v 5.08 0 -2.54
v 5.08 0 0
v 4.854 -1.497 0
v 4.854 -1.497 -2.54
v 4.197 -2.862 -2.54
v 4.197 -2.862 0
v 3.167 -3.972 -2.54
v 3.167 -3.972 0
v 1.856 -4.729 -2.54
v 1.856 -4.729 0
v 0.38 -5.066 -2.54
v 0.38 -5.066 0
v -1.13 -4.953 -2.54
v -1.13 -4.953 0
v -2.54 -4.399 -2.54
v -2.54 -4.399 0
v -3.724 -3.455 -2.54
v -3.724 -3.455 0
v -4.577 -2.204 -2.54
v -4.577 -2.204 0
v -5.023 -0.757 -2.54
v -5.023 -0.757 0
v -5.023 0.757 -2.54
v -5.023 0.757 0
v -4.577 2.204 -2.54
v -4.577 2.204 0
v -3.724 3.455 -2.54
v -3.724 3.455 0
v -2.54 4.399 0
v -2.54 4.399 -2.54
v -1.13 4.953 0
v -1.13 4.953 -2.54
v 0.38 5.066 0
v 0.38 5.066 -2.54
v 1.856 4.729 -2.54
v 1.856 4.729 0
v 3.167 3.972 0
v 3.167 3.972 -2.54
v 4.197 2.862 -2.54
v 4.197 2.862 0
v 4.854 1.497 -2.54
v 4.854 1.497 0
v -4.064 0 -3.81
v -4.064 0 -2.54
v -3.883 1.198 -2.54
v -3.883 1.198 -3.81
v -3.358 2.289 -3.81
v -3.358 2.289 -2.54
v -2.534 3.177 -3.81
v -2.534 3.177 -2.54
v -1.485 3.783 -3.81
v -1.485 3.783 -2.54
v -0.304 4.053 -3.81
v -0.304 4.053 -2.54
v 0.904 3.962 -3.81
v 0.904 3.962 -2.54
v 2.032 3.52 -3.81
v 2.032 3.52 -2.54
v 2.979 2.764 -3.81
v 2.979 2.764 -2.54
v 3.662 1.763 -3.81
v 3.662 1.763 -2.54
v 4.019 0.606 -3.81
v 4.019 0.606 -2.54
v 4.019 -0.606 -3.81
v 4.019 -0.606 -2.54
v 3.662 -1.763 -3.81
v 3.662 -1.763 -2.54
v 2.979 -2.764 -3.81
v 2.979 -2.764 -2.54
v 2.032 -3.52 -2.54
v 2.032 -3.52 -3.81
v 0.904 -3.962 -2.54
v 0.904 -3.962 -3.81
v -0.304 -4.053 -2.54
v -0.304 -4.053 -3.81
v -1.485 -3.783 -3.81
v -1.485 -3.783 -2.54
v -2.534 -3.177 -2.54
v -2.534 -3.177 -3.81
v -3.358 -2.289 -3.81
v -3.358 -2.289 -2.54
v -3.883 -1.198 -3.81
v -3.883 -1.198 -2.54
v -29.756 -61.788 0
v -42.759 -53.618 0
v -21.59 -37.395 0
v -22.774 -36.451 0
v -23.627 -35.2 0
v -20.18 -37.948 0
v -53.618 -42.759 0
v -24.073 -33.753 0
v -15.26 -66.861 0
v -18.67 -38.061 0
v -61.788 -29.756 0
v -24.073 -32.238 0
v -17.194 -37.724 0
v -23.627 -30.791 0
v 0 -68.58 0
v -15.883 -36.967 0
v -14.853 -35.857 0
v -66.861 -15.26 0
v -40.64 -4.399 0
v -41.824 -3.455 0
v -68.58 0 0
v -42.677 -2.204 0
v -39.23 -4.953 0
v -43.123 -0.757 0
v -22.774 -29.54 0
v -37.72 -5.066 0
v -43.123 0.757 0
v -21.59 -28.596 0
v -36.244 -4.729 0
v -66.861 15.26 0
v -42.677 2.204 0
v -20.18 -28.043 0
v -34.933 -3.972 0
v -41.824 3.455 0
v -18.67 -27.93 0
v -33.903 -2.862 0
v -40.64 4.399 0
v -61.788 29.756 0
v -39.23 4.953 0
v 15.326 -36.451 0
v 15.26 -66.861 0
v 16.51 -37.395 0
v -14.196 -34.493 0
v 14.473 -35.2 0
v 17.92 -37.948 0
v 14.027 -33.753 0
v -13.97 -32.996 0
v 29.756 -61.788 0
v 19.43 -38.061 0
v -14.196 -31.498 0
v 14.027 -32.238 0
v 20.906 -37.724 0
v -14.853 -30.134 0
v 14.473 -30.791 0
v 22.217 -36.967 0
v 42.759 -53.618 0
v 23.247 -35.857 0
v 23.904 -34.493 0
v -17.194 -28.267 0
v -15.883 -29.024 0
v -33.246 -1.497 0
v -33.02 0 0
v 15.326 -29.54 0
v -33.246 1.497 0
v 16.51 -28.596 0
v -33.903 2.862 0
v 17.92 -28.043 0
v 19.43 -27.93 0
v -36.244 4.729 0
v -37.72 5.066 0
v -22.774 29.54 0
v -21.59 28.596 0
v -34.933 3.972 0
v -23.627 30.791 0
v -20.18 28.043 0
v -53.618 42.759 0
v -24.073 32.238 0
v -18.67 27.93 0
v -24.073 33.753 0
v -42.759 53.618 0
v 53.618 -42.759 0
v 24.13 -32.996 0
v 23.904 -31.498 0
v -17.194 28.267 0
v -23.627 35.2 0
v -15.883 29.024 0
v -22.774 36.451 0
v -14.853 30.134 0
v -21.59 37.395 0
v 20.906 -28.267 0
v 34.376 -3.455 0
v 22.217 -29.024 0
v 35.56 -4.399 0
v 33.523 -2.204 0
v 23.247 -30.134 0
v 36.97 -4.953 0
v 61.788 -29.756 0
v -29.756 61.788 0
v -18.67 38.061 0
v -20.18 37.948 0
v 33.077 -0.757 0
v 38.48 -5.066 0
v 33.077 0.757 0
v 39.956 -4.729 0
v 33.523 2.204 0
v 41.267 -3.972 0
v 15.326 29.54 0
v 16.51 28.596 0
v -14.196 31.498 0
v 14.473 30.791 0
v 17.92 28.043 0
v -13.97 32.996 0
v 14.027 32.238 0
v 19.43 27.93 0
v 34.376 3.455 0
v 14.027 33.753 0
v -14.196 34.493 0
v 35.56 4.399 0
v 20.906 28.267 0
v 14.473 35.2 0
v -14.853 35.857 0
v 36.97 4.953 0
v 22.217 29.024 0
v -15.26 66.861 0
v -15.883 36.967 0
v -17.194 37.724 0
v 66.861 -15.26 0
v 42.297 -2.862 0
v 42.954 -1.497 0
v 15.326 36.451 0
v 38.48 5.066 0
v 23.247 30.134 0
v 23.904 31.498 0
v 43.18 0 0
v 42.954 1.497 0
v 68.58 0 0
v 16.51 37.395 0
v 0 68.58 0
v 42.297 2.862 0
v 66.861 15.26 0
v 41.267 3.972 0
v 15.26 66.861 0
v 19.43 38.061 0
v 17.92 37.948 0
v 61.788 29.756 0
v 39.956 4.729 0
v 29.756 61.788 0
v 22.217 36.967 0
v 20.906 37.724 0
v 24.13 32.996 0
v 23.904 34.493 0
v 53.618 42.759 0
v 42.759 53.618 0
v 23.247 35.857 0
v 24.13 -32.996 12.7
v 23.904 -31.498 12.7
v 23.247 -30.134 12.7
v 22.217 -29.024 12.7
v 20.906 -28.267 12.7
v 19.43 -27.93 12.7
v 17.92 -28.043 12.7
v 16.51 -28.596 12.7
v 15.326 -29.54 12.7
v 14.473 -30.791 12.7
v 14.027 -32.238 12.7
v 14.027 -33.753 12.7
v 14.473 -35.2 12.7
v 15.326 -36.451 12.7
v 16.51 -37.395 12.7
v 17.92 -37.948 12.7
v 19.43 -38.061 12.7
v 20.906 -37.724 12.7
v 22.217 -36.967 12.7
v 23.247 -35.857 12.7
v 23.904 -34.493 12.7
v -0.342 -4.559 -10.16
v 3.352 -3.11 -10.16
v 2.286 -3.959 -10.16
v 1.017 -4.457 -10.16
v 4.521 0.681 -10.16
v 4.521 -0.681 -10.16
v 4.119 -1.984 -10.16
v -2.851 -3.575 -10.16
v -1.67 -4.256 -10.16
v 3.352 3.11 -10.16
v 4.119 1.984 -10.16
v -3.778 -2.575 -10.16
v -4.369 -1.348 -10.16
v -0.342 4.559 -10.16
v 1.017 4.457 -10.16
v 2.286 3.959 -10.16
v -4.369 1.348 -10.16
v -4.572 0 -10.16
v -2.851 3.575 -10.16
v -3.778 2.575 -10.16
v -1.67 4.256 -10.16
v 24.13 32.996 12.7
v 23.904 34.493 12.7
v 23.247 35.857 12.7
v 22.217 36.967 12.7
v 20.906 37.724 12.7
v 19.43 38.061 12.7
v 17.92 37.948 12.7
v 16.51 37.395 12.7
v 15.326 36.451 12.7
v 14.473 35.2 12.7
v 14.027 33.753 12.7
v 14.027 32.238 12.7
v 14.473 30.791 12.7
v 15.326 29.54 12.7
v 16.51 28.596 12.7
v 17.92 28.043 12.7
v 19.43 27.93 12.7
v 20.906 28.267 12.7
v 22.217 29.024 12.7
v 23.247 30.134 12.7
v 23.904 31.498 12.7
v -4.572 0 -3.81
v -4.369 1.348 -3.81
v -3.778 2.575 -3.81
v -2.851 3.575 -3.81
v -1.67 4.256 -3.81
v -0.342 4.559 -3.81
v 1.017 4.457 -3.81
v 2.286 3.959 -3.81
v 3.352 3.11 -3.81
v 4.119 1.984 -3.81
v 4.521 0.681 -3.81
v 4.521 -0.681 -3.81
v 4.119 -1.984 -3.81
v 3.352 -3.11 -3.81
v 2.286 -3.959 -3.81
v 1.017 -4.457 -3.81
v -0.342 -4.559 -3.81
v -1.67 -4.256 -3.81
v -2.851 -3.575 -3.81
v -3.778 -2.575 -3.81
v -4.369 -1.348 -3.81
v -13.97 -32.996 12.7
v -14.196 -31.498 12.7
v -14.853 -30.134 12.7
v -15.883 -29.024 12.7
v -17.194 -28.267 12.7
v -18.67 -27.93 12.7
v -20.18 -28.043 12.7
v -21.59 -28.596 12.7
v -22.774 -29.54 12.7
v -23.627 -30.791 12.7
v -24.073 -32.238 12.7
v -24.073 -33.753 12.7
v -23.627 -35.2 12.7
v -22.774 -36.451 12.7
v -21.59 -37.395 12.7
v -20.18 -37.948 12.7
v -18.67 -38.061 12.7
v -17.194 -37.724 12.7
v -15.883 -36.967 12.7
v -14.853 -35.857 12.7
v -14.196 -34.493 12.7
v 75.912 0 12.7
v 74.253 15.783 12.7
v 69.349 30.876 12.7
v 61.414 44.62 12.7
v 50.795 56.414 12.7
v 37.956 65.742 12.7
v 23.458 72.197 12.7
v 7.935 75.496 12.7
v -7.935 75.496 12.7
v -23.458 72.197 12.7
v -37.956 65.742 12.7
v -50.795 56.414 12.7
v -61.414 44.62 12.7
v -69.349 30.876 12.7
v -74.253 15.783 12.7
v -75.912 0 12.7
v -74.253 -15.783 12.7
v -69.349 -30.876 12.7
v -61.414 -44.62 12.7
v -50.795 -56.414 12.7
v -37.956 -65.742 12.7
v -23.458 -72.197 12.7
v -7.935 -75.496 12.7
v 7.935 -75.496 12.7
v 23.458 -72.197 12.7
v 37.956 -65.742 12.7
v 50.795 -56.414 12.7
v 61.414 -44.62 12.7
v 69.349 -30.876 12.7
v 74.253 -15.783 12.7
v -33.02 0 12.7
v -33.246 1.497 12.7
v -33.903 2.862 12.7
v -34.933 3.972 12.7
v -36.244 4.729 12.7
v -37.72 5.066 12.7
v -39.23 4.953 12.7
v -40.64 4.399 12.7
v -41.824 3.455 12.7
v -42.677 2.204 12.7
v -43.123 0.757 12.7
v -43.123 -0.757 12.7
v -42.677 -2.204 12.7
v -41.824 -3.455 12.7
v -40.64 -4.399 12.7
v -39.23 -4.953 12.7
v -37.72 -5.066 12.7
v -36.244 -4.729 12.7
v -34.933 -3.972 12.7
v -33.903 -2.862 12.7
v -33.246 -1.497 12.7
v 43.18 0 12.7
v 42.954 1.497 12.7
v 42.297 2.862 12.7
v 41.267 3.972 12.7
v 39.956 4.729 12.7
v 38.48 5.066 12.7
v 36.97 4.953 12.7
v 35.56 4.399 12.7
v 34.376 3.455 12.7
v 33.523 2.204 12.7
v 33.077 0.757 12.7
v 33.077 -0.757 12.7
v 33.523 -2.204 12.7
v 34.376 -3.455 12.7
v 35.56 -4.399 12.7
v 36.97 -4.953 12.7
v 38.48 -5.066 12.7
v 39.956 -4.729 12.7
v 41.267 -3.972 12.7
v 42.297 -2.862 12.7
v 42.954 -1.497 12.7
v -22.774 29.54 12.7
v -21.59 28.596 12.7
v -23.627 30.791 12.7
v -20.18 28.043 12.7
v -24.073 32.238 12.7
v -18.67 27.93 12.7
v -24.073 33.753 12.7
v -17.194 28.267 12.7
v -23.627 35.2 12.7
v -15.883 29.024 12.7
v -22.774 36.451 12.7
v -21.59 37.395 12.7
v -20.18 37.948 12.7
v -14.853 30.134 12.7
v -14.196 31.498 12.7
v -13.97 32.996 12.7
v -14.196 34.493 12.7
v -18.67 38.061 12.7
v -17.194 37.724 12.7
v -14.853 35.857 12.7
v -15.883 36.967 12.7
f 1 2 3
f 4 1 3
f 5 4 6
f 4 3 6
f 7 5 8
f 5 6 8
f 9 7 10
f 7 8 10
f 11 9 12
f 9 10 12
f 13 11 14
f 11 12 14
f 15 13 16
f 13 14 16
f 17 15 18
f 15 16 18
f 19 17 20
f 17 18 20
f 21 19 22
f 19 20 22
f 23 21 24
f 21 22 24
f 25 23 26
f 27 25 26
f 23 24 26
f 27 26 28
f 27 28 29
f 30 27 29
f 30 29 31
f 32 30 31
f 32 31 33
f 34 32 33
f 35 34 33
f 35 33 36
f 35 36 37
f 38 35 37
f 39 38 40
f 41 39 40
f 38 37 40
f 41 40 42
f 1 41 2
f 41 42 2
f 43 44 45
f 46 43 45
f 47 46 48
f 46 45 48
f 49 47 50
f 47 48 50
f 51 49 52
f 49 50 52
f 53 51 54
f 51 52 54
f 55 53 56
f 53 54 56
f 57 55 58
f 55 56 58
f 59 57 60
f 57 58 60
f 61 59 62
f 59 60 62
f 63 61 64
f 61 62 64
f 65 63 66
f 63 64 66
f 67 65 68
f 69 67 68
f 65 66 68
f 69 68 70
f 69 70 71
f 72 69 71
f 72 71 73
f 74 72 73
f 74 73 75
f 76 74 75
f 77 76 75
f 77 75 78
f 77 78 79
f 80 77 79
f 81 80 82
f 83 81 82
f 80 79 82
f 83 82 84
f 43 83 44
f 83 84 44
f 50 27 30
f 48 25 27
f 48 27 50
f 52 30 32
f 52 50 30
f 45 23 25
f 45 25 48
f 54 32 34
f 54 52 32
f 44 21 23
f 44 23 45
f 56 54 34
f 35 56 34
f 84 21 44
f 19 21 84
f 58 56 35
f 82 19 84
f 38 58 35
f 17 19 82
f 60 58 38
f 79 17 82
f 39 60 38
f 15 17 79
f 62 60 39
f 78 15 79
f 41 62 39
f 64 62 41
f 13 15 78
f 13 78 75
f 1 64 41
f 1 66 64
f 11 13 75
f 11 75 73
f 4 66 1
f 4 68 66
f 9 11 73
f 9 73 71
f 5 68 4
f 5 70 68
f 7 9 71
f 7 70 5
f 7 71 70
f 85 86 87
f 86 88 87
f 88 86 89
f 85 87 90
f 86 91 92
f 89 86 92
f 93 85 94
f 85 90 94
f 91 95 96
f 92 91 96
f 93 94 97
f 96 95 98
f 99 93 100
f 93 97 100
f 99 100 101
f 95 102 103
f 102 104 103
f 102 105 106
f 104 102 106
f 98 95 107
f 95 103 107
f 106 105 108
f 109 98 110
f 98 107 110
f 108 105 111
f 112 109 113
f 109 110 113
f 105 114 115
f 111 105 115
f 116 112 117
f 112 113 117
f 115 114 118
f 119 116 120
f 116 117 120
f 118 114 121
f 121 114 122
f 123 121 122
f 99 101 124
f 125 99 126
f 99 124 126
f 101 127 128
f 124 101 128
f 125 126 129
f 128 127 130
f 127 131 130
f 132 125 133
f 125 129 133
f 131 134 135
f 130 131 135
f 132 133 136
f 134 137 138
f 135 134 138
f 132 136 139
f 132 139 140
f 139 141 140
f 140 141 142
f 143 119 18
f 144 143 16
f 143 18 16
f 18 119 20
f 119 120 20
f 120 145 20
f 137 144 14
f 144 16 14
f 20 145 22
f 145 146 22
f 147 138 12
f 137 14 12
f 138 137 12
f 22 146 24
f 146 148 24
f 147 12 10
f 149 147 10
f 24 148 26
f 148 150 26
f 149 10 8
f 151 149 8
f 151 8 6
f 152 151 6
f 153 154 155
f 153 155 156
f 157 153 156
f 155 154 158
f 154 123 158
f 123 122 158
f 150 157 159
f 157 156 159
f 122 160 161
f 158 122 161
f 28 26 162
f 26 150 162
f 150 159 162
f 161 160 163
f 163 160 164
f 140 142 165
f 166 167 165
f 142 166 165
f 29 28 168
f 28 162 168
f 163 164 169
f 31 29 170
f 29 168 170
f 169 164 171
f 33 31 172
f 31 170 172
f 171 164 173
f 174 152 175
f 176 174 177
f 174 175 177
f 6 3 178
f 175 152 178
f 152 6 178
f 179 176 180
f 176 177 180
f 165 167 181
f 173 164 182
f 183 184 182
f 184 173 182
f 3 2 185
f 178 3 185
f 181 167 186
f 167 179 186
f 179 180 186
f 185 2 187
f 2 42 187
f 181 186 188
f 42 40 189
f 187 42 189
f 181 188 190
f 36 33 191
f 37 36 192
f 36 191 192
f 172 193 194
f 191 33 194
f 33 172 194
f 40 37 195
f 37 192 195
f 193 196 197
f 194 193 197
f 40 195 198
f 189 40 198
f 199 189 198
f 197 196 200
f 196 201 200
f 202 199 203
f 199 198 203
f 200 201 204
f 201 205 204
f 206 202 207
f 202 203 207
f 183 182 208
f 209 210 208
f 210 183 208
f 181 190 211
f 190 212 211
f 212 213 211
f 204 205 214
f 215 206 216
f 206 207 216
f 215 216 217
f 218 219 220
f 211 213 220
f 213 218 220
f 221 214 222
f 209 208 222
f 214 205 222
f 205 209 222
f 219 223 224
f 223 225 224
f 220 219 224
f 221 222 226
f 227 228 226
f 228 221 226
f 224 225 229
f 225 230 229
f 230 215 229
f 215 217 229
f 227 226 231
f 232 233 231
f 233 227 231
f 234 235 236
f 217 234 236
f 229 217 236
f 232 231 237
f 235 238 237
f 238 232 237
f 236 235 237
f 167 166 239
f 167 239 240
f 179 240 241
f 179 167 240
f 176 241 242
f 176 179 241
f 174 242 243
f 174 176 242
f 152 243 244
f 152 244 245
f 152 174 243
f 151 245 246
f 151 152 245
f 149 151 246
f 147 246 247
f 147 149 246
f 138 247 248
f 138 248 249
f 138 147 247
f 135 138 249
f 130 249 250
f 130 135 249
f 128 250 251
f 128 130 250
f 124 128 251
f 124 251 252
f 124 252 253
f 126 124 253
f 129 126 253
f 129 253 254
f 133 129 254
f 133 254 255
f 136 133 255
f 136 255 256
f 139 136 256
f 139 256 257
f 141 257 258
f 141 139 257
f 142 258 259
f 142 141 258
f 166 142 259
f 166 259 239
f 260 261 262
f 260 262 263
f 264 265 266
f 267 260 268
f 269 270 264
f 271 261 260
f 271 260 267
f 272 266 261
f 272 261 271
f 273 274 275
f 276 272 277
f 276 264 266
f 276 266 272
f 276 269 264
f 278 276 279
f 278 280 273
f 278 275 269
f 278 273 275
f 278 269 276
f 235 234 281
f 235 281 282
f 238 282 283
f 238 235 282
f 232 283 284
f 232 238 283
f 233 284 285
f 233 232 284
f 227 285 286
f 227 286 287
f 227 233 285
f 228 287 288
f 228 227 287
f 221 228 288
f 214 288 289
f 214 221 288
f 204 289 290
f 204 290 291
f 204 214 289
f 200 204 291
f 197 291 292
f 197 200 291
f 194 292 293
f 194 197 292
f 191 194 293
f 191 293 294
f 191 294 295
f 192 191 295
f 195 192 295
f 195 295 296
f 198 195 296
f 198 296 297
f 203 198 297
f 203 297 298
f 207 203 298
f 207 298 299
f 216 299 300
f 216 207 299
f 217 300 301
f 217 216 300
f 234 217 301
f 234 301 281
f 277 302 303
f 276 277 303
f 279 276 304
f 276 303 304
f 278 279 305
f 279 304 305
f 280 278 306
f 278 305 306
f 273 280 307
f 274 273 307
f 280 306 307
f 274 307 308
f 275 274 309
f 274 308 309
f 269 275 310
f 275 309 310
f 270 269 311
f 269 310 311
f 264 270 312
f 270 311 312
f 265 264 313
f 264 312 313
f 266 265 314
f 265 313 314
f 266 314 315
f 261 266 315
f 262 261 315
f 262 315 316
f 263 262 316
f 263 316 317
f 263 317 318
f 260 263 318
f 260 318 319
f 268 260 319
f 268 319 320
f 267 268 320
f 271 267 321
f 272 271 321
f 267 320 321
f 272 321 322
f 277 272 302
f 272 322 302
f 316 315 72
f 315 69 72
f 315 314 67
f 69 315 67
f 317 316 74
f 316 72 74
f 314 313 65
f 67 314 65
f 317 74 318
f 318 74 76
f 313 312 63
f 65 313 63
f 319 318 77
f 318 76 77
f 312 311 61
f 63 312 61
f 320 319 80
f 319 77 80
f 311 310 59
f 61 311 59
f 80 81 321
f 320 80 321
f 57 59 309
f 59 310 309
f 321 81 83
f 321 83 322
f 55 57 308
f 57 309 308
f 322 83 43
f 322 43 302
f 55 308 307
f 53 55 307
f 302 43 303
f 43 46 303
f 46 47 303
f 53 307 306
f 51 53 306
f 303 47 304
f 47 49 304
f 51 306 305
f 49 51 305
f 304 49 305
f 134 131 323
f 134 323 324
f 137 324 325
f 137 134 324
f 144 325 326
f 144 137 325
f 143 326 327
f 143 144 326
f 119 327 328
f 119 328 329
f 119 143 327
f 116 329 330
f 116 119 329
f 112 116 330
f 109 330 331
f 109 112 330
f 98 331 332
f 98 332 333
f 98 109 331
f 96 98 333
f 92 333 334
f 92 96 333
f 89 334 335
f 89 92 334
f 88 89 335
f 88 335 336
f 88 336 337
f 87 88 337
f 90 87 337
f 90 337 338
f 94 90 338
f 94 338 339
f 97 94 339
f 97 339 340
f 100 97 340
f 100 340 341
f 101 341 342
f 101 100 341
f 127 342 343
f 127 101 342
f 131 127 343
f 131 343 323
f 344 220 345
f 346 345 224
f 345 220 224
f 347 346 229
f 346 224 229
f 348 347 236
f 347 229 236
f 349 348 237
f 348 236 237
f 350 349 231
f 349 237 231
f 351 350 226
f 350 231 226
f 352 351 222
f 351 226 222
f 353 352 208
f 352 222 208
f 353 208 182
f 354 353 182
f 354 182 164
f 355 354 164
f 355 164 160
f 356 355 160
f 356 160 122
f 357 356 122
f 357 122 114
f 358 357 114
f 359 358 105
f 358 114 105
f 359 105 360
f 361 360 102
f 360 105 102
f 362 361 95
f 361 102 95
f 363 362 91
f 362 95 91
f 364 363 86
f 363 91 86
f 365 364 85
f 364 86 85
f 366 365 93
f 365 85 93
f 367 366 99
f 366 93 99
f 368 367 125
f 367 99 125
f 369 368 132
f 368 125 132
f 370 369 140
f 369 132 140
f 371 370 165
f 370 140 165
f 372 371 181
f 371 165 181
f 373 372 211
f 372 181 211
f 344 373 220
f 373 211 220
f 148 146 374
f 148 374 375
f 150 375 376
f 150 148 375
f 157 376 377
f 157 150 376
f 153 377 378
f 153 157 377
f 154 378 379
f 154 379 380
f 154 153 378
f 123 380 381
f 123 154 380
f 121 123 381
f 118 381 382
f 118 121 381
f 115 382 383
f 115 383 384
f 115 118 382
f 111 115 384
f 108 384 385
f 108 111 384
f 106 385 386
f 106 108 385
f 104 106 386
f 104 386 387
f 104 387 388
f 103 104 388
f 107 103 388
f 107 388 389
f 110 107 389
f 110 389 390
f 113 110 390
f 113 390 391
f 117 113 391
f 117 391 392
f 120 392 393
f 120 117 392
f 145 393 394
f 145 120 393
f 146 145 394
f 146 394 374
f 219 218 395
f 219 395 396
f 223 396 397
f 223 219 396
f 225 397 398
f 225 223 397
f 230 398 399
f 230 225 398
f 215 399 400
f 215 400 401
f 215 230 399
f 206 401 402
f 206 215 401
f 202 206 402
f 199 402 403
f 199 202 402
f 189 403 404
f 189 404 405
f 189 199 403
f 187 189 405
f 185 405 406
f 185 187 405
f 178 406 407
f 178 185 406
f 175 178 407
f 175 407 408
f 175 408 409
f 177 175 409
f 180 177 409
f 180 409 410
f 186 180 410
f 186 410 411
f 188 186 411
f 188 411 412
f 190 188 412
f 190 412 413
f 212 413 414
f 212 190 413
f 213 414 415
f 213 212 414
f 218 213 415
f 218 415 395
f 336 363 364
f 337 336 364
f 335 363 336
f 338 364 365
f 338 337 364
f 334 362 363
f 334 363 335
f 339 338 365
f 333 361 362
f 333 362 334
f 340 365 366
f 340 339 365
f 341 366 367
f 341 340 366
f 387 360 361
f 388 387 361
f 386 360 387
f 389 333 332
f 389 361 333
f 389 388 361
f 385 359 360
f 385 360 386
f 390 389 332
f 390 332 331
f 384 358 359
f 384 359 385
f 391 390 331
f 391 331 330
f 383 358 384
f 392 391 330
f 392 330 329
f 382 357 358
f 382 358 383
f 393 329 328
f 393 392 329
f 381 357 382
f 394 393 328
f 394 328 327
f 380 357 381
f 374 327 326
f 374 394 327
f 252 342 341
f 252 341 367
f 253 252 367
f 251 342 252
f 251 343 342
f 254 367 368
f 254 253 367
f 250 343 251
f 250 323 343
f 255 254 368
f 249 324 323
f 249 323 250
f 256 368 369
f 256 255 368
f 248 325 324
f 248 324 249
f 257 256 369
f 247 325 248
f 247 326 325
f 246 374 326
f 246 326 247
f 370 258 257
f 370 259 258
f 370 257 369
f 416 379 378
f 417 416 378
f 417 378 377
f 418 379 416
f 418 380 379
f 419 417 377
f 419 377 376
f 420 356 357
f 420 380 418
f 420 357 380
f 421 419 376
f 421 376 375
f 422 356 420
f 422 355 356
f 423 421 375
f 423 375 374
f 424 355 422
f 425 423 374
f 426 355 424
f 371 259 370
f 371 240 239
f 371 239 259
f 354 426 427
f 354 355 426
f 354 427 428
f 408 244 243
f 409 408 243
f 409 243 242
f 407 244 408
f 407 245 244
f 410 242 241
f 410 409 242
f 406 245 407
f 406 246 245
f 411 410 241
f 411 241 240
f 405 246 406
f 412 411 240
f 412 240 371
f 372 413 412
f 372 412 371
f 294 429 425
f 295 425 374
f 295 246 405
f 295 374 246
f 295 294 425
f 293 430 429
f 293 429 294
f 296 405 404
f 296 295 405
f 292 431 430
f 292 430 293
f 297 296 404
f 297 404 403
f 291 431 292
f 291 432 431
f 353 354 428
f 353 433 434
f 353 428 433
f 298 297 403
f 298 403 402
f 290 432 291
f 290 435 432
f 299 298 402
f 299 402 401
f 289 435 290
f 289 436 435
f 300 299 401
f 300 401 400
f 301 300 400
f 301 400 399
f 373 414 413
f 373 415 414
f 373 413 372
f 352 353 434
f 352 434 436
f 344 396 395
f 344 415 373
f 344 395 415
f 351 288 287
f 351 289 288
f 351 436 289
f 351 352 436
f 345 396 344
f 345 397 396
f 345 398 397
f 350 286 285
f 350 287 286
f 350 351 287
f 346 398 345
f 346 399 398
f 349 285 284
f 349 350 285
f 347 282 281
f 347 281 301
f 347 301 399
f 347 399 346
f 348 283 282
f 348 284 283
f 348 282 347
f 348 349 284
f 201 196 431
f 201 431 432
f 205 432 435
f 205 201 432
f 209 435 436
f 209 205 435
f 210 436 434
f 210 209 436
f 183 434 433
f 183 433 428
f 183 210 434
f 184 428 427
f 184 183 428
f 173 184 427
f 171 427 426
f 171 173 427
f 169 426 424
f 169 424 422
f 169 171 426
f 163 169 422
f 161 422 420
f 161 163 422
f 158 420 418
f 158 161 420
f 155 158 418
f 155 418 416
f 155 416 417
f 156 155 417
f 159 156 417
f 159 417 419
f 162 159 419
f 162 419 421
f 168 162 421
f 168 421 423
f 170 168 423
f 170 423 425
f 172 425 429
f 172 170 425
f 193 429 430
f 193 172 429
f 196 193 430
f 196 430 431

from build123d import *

# Parameters (mm, degrees)
SKETCH1_R           = 76.2
SKETCH1_R_2         = 5.08
BOSS_EXTRUDE1_DEPTH = 12.7
CHAMFER1_SIZE       = 13.198227154
CHAMFER1_SIZE_2     = 7.62
SKETCH3_R           = 5.08
BOSS_EXTRUDE2_DEPTH = 2.54
SKETCH4_R           = 4.064
BOSS_EXTRUDE3_DEPTH = 1.27
SKETCH5_R           = 4.572
BOSS_EXTRUDE4_DEPTH = 6.35


with BuildPart() as part:
    # Sketch1 → Boss-Extrude1 (new body)
    with BuildSketch(Plane.XY):
        Circle(SKETCH1_R)
        with Locations((38.1, 0)):
            Circle(SKETCH1_R_2, mode=Mode.SUBTRACT)
        with Locations((19.05, -32.995567884)):
            Circle(SKETCH1_R_2, mode=Mode.SUBTRACT)
        with Locations((-19.05, -32.995567884)):
            Circle(SKETCH1_R_2, mode=Mode.SUBTRACT)
        with Locations((-38.1, 0)):
            Circle(SKETCH1_R_2, mode=Mode.SUBTRACT)
        with Locations((-19.05, 32.995567884)):
            Circle(SKETCH1_R_2, mode=Mode.SUBTRACT)
        with Locations((19.05, 32.995567884)):
            Circle(SKETCH1_R_2, mode=Mode.SUBTRACT)
    extrude(amount=BOSS_EXTRUDE1_DEPTH)

    # Chamfer1
    # the kernel refuses this chamfer: 13.198227154, 7.62 mm, written as the material it takes off along each edge
    with BuildSketch(Plane(origin=(0, 0, 0), x_dir=(1, 0, 0), z_dir=(0, -1, 0))) as chamfer1_piece_1:
        Polygon((76.2, CHAMFER1_SIZE), (76.2 - CHAMFER1_SIZE_2, 0), (76.2, 0), align=None)
    revolve(axis=Axis((0, 0, 0), (0, 0, 1)), mode=Mode.SUBTRACT)

    # Sketch3 → Boss-Extrude2 (add)
    with BuildSketch(Plane(origin=(0, 0, 0), x_dir=(-1, 0, 0), z_dir=(0, 0, -1))):
        with Locations(Location((0, 0, 0), (0, 0, 180))):
            Circle(SKETCH3_R)
    extrude(amount=BOSS_EXTRUDE2_DEPTH)

    # Sketch4 → Boss-Extrude3 (add)
    with BuildSketch(Plane(origin=(0, 0, -2.54), x_dir=(-1, 0, 0), z_dir=(0, 0, -1))):
        Circle(SKETCH4_R)
    extrude(amount=BOSS_EXTRUDE3_DEPTH)

    # Sketch5 → Boss-Extrude4 (add)
    with BuildSketch(Plane(origin=(0, 0, -3.81), x_dir=(-1, 0, 0), z_dir=(0, 0, -1))):
        Circle(SKETCH5_R)
    extrude(amount=BOSS_EXTRUDE4_DEPTH)


solid = part.part
